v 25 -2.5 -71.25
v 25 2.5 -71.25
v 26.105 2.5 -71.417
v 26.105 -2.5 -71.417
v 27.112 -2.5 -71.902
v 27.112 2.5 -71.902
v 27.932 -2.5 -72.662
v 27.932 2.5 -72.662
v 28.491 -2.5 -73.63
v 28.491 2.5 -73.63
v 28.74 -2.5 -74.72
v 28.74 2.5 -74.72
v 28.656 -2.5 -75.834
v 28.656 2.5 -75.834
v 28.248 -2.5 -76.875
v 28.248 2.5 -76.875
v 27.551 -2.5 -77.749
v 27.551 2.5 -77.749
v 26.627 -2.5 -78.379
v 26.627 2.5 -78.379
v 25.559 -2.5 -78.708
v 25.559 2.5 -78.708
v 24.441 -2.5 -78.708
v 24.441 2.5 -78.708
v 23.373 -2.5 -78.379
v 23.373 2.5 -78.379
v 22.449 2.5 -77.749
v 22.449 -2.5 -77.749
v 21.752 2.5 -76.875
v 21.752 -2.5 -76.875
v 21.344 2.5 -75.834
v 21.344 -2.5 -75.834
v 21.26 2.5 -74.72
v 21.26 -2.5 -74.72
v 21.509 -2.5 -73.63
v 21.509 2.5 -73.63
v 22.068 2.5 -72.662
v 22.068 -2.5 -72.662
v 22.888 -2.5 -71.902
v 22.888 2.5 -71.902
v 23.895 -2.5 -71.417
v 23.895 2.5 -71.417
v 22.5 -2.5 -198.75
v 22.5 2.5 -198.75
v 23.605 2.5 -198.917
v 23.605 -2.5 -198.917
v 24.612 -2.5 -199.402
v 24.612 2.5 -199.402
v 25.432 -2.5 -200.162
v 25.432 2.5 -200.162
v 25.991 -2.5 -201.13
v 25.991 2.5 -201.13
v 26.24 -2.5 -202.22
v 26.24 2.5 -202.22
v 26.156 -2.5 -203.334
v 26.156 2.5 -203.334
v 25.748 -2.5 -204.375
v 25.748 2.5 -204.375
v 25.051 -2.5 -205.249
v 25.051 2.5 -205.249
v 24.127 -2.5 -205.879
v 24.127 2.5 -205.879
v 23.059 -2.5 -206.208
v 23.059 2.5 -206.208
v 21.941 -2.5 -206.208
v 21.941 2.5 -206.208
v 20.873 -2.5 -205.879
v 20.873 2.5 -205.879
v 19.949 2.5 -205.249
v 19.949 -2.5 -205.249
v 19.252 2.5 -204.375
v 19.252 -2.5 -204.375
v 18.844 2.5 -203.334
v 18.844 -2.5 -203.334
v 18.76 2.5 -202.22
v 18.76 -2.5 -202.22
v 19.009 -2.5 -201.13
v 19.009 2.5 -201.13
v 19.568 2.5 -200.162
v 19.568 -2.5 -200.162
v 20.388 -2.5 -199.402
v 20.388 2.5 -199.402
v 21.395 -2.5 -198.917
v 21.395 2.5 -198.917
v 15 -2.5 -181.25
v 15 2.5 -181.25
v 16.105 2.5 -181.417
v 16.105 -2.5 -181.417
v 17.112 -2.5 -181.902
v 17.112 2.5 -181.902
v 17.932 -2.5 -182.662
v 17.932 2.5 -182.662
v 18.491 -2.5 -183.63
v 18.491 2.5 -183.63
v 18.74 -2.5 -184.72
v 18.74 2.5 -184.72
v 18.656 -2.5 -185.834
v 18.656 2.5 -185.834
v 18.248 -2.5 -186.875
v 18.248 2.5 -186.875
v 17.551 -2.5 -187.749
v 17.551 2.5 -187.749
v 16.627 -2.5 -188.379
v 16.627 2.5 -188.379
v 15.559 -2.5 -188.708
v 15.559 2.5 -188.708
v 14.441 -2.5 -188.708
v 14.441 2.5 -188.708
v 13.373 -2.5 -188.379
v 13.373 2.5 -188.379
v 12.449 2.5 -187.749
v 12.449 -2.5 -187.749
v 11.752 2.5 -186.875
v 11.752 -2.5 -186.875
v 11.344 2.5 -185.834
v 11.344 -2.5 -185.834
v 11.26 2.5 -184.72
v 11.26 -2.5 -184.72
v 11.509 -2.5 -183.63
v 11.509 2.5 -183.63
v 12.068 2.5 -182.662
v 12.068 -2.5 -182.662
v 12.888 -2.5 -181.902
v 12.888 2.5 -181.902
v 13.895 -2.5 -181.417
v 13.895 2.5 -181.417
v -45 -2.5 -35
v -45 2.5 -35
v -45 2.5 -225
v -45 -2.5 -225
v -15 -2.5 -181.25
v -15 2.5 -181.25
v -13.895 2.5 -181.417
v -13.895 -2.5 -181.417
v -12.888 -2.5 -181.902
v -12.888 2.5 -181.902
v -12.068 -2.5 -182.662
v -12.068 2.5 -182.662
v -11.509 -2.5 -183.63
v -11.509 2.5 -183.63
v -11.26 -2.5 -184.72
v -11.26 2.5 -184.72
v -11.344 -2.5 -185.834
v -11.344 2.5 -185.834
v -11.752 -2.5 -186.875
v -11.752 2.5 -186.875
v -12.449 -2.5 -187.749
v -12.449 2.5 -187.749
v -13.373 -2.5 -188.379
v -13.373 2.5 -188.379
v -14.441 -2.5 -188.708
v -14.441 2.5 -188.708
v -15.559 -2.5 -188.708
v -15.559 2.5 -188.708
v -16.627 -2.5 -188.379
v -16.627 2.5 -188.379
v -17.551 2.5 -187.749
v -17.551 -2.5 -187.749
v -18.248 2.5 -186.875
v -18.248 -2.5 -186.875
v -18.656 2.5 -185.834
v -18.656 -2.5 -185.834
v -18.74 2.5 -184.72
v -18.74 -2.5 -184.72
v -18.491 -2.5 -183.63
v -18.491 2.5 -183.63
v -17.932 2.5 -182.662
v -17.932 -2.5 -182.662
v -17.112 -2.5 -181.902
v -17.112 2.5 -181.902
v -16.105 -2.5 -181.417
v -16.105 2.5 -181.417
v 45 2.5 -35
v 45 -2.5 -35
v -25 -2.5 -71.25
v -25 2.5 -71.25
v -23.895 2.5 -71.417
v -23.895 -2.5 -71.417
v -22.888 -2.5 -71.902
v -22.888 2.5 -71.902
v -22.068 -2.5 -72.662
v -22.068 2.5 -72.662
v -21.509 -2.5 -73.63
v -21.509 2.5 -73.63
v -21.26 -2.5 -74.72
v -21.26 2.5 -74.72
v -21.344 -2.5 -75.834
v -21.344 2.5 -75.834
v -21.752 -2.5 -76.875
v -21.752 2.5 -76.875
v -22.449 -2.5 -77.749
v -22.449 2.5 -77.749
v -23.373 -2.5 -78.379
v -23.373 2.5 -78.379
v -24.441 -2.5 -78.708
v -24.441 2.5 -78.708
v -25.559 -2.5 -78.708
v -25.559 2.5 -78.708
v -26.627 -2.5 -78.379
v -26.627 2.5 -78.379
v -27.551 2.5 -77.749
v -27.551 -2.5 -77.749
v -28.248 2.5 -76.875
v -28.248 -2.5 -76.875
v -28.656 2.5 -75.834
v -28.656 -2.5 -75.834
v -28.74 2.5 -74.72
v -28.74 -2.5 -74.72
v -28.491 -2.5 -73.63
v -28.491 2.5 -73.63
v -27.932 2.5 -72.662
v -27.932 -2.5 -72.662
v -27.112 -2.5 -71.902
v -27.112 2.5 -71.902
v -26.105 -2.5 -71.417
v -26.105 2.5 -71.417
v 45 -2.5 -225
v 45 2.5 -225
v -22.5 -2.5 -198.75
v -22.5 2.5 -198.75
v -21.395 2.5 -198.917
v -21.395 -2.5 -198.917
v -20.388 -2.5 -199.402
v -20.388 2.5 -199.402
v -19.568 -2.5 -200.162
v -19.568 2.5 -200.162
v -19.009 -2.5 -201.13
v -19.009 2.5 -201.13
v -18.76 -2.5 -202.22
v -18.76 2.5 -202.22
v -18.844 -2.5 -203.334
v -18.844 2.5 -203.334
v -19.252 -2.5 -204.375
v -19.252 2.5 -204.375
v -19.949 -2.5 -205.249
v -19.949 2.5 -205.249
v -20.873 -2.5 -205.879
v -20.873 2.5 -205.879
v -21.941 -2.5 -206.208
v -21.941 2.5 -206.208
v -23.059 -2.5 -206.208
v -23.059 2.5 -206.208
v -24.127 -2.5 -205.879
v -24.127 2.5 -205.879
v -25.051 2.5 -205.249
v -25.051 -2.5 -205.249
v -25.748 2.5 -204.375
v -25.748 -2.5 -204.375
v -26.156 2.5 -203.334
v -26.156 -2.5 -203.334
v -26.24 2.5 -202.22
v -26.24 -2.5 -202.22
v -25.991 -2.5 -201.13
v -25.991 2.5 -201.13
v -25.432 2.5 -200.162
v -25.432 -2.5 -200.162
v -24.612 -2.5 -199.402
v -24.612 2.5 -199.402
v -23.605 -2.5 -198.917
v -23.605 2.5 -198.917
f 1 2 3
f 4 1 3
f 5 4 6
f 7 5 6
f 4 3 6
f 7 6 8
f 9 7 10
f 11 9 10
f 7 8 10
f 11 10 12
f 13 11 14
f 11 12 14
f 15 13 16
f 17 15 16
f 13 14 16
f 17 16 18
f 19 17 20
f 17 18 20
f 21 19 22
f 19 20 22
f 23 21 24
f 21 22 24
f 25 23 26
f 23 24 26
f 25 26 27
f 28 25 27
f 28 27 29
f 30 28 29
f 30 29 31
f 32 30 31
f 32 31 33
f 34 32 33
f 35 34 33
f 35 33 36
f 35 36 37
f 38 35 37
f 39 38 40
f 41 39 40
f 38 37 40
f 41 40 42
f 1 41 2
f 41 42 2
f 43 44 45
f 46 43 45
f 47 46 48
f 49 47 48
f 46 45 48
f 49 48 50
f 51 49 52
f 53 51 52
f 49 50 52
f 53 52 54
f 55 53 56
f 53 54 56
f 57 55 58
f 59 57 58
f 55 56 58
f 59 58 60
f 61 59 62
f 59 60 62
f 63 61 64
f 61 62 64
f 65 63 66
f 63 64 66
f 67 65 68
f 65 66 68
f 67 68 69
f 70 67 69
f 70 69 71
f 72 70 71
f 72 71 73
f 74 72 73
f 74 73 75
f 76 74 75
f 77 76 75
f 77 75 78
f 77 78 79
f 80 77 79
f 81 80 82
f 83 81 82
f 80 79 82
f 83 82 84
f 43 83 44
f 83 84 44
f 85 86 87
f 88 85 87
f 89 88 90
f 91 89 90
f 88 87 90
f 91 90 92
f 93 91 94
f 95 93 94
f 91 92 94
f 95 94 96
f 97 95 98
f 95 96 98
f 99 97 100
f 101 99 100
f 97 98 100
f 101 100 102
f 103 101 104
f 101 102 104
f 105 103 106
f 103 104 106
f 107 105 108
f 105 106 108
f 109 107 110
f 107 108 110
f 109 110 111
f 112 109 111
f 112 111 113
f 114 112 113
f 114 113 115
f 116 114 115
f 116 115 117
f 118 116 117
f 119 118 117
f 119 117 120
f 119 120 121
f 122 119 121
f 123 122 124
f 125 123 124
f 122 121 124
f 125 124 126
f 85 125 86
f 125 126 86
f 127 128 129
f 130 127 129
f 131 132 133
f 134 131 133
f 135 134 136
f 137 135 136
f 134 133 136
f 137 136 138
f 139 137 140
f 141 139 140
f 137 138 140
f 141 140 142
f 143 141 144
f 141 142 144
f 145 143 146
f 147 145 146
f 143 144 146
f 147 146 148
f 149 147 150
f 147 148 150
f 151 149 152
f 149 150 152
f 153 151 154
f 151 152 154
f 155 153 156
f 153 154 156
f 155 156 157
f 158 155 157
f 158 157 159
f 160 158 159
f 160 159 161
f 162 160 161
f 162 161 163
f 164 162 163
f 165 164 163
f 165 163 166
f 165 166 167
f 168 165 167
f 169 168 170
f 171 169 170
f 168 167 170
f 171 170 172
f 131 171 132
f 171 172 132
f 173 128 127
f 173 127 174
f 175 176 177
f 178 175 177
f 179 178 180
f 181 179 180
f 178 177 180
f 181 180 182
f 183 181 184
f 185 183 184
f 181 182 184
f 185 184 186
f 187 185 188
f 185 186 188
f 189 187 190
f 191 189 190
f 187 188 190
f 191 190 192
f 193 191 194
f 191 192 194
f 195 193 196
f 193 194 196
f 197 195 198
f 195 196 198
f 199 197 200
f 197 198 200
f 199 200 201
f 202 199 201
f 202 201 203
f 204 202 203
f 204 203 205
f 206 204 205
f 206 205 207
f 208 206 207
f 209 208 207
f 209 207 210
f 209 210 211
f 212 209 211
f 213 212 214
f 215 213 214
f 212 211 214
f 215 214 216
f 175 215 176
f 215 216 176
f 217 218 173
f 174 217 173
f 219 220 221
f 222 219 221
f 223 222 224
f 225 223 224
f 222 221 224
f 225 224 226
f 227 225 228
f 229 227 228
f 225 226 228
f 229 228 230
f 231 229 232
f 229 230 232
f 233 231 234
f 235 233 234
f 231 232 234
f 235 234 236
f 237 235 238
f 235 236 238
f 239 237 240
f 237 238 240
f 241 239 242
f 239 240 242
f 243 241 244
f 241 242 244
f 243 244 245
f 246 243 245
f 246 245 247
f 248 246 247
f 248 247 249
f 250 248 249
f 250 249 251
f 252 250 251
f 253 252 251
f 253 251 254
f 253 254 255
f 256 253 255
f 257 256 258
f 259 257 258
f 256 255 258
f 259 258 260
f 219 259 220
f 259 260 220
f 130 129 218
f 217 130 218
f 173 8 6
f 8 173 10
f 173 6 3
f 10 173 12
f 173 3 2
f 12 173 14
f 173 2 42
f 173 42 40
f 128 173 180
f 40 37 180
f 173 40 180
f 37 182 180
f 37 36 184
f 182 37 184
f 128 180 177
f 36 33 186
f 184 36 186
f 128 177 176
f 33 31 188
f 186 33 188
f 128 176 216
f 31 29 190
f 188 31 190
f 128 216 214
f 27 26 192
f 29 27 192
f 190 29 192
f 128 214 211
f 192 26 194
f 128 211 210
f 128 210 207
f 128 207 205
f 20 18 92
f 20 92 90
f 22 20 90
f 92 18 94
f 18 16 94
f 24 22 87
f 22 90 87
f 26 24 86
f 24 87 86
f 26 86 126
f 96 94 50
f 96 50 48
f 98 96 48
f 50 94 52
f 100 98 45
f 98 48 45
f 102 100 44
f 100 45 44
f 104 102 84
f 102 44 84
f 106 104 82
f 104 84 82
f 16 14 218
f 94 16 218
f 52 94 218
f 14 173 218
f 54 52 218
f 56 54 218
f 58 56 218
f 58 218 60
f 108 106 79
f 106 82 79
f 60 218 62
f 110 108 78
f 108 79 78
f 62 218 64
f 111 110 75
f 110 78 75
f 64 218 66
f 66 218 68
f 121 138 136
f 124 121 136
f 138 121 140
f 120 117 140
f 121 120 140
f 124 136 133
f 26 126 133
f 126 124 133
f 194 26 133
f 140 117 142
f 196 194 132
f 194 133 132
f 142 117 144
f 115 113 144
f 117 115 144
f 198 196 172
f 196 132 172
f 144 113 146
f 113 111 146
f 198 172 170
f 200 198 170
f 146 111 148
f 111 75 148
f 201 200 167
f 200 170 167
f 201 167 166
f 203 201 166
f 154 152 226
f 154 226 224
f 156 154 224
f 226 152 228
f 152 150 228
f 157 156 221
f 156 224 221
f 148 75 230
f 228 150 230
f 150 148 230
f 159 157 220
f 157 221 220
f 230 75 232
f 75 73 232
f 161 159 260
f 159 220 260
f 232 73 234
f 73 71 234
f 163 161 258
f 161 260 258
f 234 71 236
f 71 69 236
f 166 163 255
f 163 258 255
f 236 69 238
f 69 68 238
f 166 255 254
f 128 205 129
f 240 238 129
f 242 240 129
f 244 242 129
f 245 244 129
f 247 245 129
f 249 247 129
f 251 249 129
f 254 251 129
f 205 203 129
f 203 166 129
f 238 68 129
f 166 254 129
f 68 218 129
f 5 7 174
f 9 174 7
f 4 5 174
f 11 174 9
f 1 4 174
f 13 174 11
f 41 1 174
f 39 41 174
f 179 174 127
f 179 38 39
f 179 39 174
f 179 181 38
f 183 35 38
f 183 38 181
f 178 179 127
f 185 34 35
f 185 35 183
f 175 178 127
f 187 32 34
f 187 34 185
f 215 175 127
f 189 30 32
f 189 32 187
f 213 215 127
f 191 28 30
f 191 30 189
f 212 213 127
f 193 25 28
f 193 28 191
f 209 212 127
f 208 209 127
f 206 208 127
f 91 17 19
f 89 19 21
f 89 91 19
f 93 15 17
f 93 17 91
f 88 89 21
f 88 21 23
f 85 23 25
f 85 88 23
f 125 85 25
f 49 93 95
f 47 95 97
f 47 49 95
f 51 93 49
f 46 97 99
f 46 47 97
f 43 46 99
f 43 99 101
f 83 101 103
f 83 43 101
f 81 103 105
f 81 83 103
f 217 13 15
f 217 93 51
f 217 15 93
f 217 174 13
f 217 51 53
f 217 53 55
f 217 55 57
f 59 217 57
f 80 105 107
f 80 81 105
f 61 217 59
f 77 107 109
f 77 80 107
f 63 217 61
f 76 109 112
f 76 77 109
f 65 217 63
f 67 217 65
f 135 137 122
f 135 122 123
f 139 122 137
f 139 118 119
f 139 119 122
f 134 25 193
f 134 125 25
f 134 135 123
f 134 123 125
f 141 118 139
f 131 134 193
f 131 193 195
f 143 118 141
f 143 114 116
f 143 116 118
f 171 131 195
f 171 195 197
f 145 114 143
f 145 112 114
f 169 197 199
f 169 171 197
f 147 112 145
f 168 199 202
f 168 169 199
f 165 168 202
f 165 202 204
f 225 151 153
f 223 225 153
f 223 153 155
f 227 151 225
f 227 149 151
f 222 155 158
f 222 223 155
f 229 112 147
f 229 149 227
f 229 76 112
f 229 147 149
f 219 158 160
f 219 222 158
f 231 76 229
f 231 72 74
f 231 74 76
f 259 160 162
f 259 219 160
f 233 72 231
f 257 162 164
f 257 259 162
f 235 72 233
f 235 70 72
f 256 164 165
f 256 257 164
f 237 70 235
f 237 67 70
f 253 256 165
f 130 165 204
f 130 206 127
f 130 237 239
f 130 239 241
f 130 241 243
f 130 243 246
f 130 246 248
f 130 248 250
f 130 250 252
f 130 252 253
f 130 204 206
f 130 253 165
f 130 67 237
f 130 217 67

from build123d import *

# Parameters (mm, degrees)
BOSS_EXTRUDE2_DEPTH = 2.5
SKETCH5_R           = 3.75
CUT_EXTRUDE2_DEPTH  = 5
CUT_EXTRUDE3_DEPTH  = 10


with BuildPart() as part:
    # Sketch3 → Boss-Extrude2 (new, symmetric)
    with BuildSketch(Plane(origin=(0, 0, 0), x_dir=(1, 0, 0), z_dir=(0, 1, 0))):
        with BuildLine():
            Line((70, 30), (70, 10))
            ThreePointArc((70, 10), (67.071067812, 2.928932188), (60, 0))
            Line((60, 0), (-60, 0))
            ThreePointArc((-60, 0), (-67.071067812, 2.928932188), (-70, 10))
            Line((-70, 10), (-70, 30))
            ThreePointArc((-70, 30), (-68.535533906, 33.535533906), (-65, 35))
            Line((-65, 35), (-45, 35))
            Line((-45, 35), (-45, 103))
            Line((-45, 103), (-60, 103))
            ThreePointArc((-60, 103), (-67.071067812, 105.928932188), (-70, 113))
            Line((-70, 113), (-70, 147))
            ThreePointArc((-70, 147), (-67.071067812, 154.071067812), (-60, 157))
            Line((-60, 157), (-45, 157))
            Line((-45, 157), (-45, 225))
            Line((-45, 225), (-65.064414928, 225))
            ThreePointArc((-65.064414928, 225), (-68.304785278, 226.192113447), (-70, 229.2))
            Line((-70, 229.2), (-70, 245))
            ThreePointArc((-70, 245), (-66.467868189, 254.855318839), (-57.35, 260))
            Line((-57.35, 260), (57.35, 260))
            ThreePointArc((57.35, 260), (66.467868189, 254.855318839), (70, 245))
            Line((70, 245), (70, 229.2))
            ThreePointArc((70, 229.2), (68.304785278, 226.192113447), (65.064414928, 225))
            Line((65.064414928, 225), (45, 225))
            Line((45, 225), (45, 157))
            Line((45, 157), (60, 157))
            ThreePointArc((60, 157), (67.071067812, 154.071067812), (70, 147))
            Line((70, 147), (70, 113))
            ThreePointArc((70, 113), (67.071067812, 105.928932188), (60, 103))
            Line((60, 103), (45, 103))
            Line((45, 103), (45, 35))
            Line((45, 35), (65, 35))
            ThreePointArc((65, 35), (68.535533906, 33.535533906), (70, 30))
        make_face()
    extrude(amount=BOSS_EXTRUDE2_DEPTH, both=True)

    # Sketch5 → Cut-Extrude2 (cut)
    with BuildSketch(Plane(origin=(0, 2.5, 0), x_dir=(1, 0, 0), z_dir=(0, 1, 0))):
        with Locations(Location((-25, 75, 0), (0, 0, 270))):
            Circle(SKETCH5_R)
        with Locations(Location((-22.5, 202.5, 0), (0, 0, 270))):
            Circle(SKETCH5_R)
        with Locations(Location((-15, 185, 0), (0, 0, 270))):
            Circle(SKETCH5_R)
        with Locations(Location((25, 75, 0), (0, 0, 270))):
            Circle(SKETCH5_R)
        with Locations(Location((15, 185, 0), (0, 0, 270))):
            Circle(SKETCH5_R)
        with Locations(Location((22.5, 202.5, 0), (0, 0, 270))):
            Circle(SKETCH5_R)
    extrude(amount=-CUT_EXTRUDE2_DEPTH, mode=Mode.SUBTRACT)

    # Sketch6 → Cut-Extrude3 (cut)
    with BuildSketch(Plane(origin=(0, 2.5, 0), x_dir=(1, 0, 0), z_dir=(0, 1, 0))):
        with BuildLine():
            Line((-45, 157), (-45, 103))
            Line((-45, 103), (-60, 103))
            ThreePointArc((-60, 103), (-67.071067812, 105.928932188), (-70, 113))
            Line((-70, 113), (-70, 147))
            ThreePointArc((-70, 147), (-67.071067812, 154.071067812), (-60, 157))
            Line((-60, 157), (-45, 157))
        make_face()
        with BuildLine():
            Line((-45, 35), (45, 35))
            Line((45, 35), (65, 35))
            ThreePointArc((65, 35), (68.535533906, 33.535533906), (70, 30))
            Line((70, 30), (70, 10))
            ThreePointArc((70, 10), (67.071067812, 2.928932188), (60, 0))
            Line((60, 0), (-60, 0))
            ThreePointArc((-60, 0), (-67.071067812, 2.928932188), (-70, 10))
            Line((-70, 10), (-70, 30))
            ThreePointArc((-70, 30), (-68.535533906, 33.535533906), (-65, 35))
            Line((-65, 35), (-45, 35))
        make_face()
        with BuildLine():
            Line((45, 157), (45, 103))
            Line((45, 103), (60, 103))
            ThreePointArc((60, 103), (67.071067812, 105.928932188), (70, 113))
            Line((70, 113), (70, 147))
            ThreePointArc((70, 147), (67.071067812, 154.071067812), (60, 157))
            Line((60, 157), (45, 157))
        make_face()
        with BuildLine():
            Line((-45, 225), (45, 225))
            Line((45, 225), (65.064414928, 225))
            ThreePointArc((65.064414928, 225), (68.304785278, 226.192113447), (70, 229.2))
            Line((70, 229.2), (70, 245))
            ThreePointArc((70, 245), (66.467868189, 254.855318839), (57.35, 260))
            Line((57.35, 260), (-57.35, 260))
            ThreePointArc((-57.35, 260), (-66.467868189, 254.855318839), (-70, 245))
            Line((-70, 245), (-70, 229.2))
            ThreePointArc((-70, 229.2), (-68.304785278, 226.192113447), (-65.064414928, 225))
            Line((-65.064414928, 225), (-45, 225))
        make_face()
    extrude(amount=-CUT_EXTRUDE3_DEPTH, mode=Mode.SUBTRACT)


solid = part.part
